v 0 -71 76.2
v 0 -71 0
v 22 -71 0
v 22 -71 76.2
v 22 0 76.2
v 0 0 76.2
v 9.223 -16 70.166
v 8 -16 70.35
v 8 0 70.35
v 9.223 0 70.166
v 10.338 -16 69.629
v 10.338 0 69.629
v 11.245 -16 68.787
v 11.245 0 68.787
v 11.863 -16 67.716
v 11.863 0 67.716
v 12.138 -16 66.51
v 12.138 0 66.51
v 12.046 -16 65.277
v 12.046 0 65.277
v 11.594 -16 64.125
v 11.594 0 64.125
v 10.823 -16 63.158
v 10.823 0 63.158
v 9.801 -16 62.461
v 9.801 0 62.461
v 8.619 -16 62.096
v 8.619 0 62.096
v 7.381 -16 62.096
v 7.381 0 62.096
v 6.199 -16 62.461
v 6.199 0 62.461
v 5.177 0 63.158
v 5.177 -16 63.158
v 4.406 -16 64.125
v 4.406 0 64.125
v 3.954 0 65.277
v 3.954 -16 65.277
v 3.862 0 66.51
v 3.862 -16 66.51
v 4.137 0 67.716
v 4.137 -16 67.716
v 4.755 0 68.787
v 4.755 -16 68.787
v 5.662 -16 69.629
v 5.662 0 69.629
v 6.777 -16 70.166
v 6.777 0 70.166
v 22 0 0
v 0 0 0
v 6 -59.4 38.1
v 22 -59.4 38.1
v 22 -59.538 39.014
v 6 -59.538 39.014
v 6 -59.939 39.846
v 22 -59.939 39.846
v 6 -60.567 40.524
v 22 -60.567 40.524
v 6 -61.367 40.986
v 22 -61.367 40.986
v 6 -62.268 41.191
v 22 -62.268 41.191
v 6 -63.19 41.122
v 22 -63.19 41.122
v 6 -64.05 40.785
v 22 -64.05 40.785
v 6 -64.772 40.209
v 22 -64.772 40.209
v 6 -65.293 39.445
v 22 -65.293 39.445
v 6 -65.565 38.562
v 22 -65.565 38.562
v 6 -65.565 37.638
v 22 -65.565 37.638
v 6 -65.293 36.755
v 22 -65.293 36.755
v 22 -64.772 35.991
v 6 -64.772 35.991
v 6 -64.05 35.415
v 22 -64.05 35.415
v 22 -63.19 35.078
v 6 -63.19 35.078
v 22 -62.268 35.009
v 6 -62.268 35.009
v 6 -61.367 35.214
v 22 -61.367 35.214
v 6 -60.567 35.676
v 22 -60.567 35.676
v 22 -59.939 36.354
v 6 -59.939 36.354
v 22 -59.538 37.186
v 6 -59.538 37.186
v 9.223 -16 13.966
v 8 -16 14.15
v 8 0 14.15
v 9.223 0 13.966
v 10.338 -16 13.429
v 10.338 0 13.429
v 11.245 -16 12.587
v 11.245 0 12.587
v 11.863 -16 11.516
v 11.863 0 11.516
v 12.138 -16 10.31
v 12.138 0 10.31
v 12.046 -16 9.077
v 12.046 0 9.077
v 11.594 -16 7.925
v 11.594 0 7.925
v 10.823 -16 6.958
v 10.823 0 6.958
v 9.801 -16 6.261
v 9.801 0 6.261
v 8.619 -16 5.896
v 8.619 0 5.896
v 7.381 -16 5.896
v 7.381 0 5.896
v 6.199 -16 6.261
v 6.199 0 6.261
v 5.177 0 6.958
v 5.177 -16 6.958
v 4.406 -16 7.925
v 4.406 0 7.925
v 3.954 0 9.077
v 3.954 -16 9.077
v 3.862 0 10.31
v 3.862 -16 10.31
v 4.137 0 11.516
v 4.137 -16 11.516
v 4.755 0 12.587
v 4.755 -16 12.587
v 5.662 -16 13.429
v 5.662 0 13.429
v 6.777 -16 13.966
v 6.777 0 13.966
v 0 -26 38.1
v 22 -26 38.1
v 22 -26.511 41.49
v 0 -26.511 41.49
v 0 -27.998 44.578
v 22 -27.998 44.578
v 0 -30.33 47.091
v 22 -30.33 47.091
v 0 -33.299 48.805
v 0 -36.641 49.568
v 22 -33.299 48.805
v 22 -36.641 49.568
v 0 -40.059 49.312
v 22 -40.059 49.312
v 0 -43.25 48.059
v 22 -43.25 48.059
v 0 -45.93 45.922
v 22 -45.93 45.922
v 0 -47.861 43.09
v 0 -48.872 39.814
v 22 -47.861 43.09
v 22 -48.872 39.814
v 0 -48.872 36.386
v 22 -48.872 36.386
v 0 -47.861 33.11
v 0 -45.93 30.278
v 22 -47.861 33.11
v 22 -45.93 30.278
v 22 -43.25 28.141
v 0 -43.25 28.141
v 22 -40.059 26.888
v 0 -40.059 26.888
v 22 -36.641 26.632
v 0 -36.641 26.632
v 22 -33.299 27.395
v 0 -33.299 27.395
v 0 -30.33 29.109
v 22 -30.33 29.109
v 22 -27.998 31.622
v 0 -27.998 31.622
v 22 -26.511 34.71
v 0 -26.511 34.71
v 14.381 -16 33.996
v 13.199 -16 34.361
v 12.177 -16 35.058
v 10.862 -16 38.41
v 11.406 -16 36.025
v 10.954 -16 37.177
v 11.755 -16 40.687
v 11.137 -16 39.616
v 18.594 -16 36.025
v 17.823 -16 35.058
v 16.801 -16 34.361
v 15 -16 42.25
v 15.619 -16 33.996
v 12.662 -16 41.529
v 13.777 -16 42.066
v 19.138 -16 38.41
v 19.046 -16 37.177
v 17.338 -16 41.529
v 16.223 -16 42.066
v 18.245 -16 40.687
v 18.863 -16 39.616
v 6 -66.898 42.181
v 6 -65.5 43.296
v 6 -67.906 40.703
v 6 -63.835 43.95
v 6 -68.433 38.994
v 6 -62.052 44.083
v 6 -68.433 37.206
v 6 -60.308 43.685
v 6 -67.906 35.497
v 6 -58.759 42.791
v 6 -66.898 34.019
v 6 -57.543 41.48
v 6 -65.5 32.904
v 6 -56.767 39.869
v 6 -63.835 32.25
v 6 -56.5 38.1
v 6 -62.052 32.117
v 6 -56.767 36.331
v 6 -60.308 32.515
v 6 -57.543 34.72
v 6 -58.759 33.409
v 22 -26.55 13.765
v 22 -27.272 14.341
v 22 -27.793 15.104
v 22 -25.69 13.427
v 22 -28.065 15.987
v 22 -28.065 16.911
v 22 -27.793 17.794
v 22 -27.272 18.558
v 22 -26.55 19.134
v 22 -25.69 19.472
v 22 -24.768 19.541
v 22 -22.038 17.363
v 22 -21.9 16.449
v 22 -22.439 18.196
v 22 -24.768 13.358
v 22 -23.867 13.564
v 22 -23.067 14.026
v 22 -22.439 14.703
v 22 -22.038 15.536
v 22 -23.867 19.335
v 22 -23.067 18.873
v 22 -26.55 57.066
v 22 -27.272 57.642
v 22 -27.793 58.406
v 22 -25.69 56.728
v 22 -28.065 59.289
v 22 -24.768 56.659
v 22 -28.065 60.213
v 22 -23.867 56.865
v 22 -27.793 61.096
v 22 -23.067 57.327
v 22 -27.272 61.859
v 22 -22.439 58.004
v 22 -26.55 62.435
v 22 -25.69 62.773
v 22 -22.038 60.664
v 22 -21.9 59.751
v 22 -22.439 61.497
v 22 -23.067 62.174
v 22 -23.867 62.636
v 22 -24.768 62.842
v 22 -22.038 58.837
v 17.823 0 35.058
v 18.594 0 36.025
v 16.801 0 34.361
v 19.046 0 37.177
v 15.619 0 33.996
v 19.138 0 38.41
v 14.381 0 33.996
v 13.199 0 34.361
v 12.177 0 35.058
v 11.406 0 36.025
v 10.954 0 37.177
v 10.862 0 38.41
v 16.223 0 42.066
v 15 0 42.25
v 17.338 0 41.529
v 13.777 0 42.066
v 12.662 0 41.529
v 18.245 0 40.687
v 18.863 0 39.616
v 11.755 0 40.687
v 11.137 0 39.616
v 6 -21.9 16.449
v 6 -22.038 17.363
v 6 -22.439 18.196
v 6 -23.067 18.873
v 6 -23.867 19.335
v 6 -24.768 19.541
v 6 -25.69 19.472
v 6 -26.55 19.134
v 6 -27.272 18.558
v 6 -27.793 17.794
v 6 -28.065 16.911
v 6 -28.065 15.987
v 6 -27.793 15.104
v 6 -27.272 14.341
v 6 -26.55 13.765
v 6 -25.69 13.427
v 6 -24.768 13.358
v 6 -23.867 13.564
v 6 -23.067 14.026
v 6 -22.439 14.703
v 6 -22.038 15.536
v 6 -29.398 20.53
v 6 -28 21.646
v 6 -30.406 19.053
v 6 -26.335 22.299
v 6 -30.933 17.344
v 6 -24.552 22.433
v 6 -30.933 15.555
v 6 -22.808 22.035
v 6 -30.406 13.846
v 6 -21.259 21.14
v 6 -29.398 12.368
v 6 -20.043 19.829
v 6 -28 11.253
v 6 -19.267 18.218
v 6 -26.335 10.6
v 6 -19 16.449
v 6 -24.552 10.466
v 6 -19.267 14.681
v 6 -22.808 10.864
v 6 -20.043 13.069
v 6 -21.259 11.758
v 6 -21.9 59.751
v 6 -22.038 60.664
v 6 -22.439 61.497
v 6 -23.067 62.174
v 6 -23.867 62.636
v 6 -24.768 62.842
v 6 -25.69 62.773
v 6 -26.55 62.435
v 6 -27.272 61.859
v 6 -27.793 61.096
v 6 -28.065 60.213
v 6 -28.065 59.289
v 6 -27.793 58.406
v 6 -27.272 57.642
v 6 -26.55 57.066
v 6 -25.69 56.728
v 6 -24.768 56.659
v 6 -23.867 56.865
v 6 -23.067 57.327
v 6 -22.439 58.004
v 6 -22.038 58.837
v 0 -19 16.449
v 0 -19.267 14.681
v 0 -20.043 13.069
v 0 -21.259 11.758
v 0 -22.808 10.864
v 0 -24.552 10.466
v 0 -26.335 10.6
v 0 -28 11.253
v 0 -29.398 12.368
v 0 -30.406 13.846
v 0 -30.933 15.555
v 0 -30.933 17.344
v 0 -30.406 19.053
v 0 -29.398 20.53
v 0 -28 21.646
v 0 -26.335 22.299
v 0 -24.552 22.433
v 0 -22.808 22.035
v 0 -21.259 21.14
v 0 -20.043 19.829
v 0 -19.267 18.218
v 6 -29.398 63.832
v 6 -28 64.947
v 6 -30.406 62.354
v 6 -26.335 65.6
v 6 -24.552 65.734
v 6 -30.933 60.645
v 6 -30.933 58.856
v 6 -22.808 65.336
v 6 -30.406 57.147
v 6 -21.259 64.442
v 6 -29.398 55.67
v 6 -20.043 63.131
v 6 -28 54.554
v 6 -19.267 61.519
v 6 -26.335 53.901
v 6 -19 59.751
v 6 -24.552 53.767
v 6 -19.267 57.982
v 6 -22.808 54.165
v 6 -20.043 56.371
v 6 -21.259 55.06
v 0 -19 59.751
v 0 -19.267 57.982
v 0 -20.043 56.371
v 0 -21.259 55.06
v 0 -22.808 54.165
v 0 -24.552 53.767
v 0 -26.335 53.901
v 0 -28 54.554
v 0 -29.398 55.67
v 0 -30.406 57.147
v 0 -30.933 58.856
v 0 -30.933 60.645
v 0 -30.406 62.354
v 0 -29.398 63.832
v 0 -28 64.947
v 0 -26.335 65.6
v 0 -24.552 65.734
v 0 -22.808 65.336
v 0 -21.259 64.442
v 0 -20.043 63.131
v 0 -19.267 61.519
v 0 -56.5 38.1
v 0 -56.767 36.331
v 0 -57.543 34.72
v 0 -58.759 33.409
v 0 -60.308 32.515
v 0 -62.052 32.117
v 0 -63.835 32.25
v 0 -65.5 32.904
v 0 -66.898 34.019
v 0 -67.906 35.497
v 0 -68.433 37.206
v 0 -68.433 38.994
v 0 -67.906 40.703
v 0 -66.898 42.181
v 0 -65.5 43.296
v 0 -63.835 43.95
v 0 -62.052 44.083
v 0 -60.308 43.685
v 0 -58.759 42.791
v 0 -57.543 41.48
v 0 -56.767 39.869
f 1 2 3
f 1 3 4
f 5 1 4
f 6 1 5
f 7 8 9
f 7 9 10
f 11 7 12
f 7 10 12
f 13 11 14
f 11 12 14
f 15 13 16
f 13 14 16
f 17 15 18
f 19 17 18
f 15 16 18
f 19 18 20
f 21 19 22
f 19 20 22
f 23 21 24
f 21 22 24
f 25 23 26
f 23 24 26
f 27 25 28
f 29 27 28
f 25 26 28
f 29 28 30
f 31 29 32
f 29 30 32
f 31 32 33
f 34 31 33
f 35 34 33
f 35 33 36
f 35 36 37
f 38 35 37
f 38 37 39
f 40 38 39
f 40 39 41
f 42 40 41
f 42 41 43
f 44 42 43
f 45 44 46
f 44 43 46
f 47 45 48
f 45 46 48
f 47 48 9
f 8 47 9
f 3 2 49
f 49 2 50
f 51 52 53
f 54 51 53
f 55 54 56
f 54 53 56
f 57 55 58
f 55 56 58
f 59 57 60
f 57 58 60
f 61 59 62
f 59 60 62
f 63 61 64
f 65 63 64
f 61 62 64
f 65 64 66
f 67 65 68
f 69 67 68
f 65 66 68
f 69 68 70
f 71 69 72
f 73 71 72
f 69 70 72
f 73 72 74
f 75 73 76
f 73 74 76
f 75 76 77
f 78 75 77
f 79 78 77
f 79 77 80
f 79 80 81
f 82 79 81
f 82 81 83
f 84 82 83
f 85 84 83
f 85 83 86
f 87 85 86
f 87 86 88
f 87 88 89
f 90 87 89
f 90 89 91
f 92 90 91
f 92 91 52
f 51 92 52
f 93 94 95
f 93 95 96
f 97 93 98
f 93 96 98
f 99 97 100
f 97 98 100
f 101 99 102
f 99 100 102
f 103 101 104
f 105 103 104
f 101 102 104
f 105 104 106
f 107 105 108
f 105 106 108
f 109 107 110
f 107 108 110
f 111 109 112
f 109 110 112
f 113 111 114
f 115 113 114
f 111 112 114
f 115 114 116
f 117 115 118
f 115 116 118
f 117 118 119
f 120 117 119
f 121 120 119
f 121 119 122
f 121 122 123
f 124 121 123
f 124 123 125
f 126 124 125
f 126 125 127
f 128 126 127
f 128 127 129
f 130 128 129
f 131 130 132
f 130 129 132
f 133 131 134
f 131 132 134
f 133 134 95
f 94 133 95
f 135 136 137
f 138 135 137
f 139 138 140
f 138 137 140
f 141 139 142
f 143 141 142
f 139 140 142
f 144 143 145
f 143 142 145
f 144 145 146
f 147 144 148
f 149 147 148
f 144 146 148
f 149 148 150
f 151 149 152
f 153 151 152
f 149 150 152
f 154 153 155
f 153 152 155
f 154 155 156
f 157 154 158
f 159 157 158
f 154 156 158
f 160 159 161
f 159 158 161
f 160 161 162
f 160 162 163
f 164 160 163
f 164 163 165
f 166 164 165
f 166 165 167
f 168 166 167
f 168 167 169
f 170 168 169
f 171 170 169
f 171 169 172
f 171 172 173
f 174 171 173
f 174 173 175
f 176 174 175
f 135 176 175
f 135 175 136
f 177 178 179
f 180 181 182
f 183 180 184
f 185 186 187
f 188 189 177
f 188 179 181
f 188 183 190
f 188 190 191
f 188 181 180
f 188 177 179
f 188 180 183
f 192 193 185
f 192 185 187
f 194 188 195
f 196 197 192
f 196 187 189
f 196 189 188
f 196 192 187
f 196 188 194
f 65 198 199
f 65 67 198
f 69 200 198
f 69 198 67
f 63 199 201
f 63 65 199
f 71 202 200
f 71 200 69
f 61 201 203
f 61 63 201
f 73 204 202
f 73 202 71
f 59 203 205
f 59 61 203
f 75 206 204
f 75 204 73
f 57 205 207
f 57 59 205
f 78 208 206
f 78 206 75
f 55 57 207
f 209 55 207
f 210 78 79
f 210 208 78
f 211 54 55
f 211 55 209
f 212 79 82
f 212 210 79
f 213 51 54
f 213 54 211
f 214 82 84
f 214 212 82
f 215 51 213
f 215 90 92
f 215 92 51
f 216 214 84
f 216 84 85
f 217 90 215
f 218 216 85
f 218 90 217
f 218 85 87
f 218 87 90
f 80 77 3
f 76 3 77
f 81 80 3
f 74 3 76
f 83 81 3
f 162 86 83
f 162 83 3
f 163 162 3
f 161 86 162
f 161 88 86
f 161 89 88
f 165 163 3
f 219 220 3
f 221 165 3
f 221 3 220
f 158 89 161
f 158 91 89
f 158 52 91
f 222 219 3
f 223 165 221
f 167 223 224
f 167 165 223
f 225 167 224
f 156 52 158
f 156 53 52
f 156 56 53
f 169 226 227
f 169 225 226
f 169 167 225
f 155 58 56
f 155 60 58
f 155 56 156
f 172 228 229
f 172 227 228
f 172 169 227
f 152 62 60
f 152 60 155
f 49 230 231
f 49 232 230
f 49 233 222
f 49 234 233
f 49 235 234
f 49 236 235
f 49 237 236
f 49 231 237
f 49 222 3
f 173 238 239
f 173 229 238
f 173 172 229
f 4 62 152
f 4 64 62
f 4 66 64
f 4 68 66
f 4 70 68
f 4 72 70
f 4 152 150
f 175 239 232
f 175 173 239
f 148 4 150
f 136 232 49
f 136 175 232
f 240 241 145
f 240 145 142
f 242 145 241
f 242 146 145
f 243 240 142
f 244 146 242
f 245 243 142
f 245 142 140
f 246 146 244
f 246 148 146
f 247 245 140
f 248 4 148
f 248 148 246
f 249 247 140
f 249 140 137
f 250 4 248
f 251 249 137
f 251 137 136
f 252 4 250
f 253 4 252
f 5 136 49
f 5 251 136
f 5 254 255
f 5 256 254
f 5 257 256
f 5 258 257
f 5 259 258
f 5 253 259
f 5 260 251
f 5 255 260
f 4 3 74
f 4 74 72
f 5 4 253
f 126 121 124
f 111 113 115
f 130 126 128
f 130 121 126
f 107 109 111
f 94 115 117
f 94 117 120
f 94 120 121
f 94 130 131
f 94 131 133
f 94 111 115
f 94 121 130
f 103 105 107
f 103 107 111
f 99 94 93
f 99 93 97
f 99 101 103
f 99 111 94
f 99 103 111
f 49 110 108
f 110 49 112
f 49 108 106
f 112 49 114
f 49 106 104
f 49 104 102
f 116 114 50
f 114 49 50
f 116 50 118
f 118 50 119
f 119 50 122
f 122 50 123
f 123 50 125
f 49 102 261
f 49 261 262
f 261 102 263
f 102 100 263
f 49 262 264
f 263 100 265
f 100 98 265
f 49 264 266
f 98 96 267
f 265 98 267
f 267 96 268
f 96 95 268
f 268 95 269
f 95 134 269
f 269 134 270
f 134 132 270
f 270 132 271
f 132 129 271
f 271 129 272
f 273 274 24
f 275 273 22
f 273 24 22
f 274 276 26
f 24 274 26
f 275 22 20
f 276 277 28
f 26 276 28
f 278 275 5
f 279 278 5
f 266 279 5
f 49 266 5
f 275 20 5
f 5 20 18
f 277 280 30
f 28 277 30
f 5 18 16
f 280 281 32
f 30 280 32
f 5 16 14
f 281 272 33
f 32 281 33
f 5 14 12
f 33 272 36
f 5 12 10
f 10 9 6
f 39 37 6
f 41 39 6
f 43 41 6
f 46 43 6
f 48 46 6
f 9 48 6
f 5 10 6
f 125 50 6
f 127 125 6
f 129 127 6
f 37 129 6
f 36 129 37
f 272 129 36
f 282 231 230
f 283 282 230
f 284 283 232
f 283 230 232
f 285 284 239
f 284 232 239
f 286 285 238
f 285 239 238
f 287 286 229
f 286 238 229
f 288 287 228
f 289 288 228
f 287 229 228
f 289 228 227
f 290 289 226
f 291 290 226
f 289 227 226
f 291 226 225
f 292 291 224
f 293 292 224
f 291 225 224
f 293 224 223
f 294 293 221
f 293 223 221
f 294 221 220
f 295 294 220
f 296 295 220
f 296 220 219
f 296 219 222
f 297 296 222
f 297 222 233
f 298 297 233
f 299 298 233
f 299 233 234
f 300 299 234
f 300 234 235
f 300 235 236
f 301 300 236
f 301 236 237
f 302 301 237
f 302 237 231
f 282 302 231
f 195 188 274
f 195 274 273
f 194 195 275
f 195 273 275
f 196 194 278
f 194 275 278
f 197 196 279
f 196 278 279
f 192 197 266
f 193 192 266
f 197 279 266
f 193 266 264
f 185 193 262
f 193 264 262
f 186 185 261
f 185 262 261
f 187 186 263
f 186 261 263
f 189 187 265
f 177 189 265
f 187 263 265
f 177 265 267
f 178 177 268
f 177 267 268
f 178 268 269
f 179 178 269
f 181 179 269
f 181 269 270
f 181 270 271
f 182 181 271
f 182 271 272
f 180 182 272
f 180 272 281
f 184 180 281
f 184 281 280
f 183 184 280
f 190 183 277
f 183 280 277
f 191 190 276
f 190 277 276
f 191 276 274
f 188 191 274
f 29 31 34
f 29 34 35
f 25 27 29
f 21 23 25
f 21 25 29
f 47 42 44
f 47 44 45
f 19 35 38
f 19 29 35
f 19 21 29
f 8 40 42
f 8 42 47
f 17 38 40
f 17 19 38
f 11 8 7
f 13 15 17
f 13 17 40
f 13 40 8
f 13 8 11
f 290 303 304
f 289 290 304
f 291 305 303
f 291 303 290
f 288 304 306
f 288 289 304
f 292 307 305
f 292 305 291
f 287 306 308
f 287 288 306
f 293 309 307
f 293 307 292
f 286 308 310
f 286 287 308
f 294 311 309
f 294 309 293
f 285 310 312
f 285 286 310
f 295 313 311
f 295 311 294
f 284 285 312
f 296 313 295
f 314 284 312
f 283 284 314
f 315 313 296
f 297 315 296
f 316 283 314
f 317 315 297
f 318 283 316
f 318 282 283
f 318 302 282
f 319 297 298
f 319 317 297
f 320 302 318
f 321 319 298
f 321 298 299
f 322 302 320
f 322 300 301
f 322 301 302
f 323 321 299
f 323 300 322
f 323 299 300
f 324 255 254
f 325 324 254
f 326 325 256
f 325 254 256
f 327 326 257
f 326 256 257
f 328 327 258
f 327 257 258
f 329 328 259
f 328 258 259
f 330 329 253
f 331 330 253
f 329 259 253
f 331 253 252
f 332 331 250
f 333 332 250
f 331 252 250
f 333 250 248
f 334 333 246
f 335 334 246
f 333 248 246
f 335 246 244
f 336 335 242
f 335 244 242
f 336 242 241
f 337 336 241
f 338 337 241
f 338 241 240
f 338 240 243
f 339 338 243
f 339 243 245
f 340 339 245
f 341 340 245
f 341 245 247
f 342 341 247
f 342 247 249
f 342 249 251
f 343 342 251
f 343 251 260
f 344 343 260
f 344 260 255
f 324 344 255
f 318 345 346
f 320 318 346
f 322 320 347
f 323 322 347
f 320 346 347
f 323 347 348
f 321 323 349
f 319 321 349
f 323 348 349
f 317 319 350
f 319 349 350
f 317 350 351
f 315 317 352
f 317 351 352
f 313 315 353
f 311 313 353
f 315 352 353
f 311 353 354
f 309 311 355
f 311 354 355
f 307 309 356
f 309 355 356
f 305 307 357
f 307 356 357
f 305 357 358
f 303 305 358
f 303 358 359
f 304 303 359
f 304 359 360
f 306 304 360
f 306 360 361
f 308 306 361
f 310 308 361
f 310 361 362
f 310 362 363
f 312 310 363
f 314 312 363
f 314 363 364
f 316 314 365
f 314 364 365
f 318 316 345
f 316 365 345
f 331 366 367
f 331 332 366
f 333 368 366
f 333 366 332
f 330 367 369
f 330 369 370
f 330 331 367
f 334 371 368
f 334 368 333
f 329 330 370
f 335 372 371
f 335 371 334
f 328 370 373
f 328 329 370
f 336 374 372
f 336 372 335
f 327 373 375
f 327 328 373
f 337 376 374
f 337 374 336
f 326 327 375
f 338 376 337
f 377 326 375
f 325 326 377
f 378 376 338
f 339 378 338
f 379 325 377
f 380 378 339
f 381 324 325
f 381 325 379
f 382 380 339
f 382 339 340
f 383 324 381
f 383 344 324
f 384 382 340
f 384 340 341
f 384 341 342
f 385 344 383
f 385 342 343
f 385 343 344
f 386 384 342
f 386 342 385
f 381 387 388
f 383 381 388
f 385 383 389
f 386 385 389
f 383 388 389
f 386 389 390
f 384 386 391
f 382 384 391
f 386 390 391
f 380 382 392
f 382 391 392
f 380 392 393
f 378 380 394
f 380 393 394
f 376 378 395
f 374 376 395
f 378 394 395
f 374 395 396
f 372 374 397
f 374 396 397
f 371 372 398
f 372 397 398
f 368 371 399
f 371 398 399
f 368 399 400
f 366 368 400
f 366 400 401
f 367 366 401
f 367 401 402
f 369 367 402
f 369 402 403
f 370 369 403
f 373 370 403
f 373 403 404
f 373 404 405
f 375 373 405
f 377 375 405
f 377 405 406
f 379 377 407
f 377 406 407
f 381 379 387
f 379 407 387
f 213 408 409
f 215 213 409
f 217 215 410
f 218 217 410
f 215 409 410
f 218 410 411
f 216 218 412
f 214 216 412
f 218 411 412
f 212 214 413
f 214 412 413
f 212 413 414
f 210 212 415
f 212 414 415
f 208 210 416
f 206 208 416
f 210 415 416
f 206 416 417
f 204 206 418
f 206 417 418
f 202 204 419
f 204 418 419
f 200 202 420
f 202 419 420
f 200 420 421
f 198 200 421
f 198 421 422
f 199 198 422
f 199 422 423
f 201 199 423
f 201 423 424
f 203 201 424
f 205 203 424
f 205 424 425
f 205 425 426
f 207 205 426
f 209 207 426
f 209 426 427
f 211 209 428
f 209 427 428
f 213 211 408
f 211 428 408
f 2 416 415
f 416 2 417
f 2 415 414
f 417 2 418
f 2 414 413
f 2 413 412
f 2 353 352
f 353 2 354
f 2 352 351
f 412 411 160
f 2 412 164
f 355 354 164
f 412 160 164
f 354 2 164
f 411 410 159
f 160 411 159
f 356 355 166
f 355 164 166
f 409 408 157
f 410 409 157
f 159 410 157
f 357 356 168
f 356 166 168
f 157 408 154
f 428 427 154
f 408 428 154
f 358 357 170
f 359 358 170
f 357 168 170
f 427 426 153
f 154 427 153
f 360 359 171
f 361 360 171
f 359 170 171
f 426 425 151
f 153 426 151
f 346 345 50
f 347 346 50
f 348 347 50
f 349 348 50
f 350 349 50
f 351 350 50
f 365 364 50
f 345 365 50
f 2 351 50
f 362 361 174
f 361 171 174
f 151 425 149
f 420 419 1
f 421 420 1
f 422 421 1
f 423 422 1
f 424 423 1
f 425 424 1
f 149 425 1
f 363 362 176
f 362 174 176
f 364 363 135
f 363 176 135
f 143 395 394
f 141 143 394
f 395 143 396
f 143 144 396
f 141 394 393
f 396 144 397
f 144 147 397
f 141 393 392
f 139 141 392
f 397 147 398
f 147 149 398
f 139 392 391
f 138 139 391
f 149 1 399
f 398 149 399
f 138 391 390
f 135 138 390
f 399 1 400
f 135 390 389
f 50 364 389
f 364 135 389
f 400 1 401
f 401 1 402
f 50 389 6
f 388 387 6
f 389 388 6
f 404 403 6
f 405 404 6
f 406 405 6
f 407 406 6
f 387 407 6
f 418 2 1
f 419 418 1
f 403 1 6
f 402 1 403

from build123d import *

# Parameters (mm, degrees)
SKETCH005_W     = 71
SKETCH005_H     = 76.2
PAD_DEPTH       = 22
SKETCH003_R     = 11.5
SKETCH003_R_2   = 3.1
POCKET_DEPTH    = 30
SKETCH004_R     = 4.15
POCKET001_DEPTH = 16
SKETCH_R        = 6
POCKET002_DEPTH = 6


with BuildPart() as part:
    # Sketch005 → Pad (new body)
    with BuildSketch(Plane.YZ):
        with Locations((-35.5, 38.1)):
            Rectangle(SKETCH005_W, SKETCH005_H)
    extrude(amount=PAD_DEPTH)

    # Sketch003 → Pocket (cut)
    with BuildSketch(Plane.YZ.offset(22)):
        with Locations((-37.5, 38.1)):
            Circle(SKETCH003_R)
        with Locations((-25, 16.449365)):
            Circle(SKETCH003_R_2)
        with Locations((-25, 59.750635)):
            Circle(SKETCH003_R_2)
        with Locations((-62.5, 38.1)):
            Circle(SKETCH003_R_2)
    extrude(amount=-POCKET_DEPTH, mode=Mode.SUBTRACT)

    # Sketch004 → Pocket001 (cut)
    with BuildSketch(Plane.ZX):
        with Locations((10, 8)):
            Circle(SKETCH004_R)
        with Locations((66.2, 8)):
            Circle(SKETCH004_R)
        with Locations((38.1, 15)):
            Circle(SKETCH004_R)
    extrude(amount=-POCKET001_DEPTH, mode=Mode.SUBTRACT)

    # Sketch → Pocket002 (cut)
    with BuildSketch(Plane(origin=(0, 0, 0), x_dir=(0, 1, 0), z_dir=(-1, 0, 0))):
        with Locations((-25, -59.750635)):
            Circle(SKETCH_R)
        with Locations((-25, -16.449365)):
            Circle(SKETCH_R)
        with Locations((-62.5, -38.1)):
            Circle(SKETCH_R)
    extrude(amount=-POCKET002_DEPTH, mode=Mode.SUBTRACT)


solid = part.part
